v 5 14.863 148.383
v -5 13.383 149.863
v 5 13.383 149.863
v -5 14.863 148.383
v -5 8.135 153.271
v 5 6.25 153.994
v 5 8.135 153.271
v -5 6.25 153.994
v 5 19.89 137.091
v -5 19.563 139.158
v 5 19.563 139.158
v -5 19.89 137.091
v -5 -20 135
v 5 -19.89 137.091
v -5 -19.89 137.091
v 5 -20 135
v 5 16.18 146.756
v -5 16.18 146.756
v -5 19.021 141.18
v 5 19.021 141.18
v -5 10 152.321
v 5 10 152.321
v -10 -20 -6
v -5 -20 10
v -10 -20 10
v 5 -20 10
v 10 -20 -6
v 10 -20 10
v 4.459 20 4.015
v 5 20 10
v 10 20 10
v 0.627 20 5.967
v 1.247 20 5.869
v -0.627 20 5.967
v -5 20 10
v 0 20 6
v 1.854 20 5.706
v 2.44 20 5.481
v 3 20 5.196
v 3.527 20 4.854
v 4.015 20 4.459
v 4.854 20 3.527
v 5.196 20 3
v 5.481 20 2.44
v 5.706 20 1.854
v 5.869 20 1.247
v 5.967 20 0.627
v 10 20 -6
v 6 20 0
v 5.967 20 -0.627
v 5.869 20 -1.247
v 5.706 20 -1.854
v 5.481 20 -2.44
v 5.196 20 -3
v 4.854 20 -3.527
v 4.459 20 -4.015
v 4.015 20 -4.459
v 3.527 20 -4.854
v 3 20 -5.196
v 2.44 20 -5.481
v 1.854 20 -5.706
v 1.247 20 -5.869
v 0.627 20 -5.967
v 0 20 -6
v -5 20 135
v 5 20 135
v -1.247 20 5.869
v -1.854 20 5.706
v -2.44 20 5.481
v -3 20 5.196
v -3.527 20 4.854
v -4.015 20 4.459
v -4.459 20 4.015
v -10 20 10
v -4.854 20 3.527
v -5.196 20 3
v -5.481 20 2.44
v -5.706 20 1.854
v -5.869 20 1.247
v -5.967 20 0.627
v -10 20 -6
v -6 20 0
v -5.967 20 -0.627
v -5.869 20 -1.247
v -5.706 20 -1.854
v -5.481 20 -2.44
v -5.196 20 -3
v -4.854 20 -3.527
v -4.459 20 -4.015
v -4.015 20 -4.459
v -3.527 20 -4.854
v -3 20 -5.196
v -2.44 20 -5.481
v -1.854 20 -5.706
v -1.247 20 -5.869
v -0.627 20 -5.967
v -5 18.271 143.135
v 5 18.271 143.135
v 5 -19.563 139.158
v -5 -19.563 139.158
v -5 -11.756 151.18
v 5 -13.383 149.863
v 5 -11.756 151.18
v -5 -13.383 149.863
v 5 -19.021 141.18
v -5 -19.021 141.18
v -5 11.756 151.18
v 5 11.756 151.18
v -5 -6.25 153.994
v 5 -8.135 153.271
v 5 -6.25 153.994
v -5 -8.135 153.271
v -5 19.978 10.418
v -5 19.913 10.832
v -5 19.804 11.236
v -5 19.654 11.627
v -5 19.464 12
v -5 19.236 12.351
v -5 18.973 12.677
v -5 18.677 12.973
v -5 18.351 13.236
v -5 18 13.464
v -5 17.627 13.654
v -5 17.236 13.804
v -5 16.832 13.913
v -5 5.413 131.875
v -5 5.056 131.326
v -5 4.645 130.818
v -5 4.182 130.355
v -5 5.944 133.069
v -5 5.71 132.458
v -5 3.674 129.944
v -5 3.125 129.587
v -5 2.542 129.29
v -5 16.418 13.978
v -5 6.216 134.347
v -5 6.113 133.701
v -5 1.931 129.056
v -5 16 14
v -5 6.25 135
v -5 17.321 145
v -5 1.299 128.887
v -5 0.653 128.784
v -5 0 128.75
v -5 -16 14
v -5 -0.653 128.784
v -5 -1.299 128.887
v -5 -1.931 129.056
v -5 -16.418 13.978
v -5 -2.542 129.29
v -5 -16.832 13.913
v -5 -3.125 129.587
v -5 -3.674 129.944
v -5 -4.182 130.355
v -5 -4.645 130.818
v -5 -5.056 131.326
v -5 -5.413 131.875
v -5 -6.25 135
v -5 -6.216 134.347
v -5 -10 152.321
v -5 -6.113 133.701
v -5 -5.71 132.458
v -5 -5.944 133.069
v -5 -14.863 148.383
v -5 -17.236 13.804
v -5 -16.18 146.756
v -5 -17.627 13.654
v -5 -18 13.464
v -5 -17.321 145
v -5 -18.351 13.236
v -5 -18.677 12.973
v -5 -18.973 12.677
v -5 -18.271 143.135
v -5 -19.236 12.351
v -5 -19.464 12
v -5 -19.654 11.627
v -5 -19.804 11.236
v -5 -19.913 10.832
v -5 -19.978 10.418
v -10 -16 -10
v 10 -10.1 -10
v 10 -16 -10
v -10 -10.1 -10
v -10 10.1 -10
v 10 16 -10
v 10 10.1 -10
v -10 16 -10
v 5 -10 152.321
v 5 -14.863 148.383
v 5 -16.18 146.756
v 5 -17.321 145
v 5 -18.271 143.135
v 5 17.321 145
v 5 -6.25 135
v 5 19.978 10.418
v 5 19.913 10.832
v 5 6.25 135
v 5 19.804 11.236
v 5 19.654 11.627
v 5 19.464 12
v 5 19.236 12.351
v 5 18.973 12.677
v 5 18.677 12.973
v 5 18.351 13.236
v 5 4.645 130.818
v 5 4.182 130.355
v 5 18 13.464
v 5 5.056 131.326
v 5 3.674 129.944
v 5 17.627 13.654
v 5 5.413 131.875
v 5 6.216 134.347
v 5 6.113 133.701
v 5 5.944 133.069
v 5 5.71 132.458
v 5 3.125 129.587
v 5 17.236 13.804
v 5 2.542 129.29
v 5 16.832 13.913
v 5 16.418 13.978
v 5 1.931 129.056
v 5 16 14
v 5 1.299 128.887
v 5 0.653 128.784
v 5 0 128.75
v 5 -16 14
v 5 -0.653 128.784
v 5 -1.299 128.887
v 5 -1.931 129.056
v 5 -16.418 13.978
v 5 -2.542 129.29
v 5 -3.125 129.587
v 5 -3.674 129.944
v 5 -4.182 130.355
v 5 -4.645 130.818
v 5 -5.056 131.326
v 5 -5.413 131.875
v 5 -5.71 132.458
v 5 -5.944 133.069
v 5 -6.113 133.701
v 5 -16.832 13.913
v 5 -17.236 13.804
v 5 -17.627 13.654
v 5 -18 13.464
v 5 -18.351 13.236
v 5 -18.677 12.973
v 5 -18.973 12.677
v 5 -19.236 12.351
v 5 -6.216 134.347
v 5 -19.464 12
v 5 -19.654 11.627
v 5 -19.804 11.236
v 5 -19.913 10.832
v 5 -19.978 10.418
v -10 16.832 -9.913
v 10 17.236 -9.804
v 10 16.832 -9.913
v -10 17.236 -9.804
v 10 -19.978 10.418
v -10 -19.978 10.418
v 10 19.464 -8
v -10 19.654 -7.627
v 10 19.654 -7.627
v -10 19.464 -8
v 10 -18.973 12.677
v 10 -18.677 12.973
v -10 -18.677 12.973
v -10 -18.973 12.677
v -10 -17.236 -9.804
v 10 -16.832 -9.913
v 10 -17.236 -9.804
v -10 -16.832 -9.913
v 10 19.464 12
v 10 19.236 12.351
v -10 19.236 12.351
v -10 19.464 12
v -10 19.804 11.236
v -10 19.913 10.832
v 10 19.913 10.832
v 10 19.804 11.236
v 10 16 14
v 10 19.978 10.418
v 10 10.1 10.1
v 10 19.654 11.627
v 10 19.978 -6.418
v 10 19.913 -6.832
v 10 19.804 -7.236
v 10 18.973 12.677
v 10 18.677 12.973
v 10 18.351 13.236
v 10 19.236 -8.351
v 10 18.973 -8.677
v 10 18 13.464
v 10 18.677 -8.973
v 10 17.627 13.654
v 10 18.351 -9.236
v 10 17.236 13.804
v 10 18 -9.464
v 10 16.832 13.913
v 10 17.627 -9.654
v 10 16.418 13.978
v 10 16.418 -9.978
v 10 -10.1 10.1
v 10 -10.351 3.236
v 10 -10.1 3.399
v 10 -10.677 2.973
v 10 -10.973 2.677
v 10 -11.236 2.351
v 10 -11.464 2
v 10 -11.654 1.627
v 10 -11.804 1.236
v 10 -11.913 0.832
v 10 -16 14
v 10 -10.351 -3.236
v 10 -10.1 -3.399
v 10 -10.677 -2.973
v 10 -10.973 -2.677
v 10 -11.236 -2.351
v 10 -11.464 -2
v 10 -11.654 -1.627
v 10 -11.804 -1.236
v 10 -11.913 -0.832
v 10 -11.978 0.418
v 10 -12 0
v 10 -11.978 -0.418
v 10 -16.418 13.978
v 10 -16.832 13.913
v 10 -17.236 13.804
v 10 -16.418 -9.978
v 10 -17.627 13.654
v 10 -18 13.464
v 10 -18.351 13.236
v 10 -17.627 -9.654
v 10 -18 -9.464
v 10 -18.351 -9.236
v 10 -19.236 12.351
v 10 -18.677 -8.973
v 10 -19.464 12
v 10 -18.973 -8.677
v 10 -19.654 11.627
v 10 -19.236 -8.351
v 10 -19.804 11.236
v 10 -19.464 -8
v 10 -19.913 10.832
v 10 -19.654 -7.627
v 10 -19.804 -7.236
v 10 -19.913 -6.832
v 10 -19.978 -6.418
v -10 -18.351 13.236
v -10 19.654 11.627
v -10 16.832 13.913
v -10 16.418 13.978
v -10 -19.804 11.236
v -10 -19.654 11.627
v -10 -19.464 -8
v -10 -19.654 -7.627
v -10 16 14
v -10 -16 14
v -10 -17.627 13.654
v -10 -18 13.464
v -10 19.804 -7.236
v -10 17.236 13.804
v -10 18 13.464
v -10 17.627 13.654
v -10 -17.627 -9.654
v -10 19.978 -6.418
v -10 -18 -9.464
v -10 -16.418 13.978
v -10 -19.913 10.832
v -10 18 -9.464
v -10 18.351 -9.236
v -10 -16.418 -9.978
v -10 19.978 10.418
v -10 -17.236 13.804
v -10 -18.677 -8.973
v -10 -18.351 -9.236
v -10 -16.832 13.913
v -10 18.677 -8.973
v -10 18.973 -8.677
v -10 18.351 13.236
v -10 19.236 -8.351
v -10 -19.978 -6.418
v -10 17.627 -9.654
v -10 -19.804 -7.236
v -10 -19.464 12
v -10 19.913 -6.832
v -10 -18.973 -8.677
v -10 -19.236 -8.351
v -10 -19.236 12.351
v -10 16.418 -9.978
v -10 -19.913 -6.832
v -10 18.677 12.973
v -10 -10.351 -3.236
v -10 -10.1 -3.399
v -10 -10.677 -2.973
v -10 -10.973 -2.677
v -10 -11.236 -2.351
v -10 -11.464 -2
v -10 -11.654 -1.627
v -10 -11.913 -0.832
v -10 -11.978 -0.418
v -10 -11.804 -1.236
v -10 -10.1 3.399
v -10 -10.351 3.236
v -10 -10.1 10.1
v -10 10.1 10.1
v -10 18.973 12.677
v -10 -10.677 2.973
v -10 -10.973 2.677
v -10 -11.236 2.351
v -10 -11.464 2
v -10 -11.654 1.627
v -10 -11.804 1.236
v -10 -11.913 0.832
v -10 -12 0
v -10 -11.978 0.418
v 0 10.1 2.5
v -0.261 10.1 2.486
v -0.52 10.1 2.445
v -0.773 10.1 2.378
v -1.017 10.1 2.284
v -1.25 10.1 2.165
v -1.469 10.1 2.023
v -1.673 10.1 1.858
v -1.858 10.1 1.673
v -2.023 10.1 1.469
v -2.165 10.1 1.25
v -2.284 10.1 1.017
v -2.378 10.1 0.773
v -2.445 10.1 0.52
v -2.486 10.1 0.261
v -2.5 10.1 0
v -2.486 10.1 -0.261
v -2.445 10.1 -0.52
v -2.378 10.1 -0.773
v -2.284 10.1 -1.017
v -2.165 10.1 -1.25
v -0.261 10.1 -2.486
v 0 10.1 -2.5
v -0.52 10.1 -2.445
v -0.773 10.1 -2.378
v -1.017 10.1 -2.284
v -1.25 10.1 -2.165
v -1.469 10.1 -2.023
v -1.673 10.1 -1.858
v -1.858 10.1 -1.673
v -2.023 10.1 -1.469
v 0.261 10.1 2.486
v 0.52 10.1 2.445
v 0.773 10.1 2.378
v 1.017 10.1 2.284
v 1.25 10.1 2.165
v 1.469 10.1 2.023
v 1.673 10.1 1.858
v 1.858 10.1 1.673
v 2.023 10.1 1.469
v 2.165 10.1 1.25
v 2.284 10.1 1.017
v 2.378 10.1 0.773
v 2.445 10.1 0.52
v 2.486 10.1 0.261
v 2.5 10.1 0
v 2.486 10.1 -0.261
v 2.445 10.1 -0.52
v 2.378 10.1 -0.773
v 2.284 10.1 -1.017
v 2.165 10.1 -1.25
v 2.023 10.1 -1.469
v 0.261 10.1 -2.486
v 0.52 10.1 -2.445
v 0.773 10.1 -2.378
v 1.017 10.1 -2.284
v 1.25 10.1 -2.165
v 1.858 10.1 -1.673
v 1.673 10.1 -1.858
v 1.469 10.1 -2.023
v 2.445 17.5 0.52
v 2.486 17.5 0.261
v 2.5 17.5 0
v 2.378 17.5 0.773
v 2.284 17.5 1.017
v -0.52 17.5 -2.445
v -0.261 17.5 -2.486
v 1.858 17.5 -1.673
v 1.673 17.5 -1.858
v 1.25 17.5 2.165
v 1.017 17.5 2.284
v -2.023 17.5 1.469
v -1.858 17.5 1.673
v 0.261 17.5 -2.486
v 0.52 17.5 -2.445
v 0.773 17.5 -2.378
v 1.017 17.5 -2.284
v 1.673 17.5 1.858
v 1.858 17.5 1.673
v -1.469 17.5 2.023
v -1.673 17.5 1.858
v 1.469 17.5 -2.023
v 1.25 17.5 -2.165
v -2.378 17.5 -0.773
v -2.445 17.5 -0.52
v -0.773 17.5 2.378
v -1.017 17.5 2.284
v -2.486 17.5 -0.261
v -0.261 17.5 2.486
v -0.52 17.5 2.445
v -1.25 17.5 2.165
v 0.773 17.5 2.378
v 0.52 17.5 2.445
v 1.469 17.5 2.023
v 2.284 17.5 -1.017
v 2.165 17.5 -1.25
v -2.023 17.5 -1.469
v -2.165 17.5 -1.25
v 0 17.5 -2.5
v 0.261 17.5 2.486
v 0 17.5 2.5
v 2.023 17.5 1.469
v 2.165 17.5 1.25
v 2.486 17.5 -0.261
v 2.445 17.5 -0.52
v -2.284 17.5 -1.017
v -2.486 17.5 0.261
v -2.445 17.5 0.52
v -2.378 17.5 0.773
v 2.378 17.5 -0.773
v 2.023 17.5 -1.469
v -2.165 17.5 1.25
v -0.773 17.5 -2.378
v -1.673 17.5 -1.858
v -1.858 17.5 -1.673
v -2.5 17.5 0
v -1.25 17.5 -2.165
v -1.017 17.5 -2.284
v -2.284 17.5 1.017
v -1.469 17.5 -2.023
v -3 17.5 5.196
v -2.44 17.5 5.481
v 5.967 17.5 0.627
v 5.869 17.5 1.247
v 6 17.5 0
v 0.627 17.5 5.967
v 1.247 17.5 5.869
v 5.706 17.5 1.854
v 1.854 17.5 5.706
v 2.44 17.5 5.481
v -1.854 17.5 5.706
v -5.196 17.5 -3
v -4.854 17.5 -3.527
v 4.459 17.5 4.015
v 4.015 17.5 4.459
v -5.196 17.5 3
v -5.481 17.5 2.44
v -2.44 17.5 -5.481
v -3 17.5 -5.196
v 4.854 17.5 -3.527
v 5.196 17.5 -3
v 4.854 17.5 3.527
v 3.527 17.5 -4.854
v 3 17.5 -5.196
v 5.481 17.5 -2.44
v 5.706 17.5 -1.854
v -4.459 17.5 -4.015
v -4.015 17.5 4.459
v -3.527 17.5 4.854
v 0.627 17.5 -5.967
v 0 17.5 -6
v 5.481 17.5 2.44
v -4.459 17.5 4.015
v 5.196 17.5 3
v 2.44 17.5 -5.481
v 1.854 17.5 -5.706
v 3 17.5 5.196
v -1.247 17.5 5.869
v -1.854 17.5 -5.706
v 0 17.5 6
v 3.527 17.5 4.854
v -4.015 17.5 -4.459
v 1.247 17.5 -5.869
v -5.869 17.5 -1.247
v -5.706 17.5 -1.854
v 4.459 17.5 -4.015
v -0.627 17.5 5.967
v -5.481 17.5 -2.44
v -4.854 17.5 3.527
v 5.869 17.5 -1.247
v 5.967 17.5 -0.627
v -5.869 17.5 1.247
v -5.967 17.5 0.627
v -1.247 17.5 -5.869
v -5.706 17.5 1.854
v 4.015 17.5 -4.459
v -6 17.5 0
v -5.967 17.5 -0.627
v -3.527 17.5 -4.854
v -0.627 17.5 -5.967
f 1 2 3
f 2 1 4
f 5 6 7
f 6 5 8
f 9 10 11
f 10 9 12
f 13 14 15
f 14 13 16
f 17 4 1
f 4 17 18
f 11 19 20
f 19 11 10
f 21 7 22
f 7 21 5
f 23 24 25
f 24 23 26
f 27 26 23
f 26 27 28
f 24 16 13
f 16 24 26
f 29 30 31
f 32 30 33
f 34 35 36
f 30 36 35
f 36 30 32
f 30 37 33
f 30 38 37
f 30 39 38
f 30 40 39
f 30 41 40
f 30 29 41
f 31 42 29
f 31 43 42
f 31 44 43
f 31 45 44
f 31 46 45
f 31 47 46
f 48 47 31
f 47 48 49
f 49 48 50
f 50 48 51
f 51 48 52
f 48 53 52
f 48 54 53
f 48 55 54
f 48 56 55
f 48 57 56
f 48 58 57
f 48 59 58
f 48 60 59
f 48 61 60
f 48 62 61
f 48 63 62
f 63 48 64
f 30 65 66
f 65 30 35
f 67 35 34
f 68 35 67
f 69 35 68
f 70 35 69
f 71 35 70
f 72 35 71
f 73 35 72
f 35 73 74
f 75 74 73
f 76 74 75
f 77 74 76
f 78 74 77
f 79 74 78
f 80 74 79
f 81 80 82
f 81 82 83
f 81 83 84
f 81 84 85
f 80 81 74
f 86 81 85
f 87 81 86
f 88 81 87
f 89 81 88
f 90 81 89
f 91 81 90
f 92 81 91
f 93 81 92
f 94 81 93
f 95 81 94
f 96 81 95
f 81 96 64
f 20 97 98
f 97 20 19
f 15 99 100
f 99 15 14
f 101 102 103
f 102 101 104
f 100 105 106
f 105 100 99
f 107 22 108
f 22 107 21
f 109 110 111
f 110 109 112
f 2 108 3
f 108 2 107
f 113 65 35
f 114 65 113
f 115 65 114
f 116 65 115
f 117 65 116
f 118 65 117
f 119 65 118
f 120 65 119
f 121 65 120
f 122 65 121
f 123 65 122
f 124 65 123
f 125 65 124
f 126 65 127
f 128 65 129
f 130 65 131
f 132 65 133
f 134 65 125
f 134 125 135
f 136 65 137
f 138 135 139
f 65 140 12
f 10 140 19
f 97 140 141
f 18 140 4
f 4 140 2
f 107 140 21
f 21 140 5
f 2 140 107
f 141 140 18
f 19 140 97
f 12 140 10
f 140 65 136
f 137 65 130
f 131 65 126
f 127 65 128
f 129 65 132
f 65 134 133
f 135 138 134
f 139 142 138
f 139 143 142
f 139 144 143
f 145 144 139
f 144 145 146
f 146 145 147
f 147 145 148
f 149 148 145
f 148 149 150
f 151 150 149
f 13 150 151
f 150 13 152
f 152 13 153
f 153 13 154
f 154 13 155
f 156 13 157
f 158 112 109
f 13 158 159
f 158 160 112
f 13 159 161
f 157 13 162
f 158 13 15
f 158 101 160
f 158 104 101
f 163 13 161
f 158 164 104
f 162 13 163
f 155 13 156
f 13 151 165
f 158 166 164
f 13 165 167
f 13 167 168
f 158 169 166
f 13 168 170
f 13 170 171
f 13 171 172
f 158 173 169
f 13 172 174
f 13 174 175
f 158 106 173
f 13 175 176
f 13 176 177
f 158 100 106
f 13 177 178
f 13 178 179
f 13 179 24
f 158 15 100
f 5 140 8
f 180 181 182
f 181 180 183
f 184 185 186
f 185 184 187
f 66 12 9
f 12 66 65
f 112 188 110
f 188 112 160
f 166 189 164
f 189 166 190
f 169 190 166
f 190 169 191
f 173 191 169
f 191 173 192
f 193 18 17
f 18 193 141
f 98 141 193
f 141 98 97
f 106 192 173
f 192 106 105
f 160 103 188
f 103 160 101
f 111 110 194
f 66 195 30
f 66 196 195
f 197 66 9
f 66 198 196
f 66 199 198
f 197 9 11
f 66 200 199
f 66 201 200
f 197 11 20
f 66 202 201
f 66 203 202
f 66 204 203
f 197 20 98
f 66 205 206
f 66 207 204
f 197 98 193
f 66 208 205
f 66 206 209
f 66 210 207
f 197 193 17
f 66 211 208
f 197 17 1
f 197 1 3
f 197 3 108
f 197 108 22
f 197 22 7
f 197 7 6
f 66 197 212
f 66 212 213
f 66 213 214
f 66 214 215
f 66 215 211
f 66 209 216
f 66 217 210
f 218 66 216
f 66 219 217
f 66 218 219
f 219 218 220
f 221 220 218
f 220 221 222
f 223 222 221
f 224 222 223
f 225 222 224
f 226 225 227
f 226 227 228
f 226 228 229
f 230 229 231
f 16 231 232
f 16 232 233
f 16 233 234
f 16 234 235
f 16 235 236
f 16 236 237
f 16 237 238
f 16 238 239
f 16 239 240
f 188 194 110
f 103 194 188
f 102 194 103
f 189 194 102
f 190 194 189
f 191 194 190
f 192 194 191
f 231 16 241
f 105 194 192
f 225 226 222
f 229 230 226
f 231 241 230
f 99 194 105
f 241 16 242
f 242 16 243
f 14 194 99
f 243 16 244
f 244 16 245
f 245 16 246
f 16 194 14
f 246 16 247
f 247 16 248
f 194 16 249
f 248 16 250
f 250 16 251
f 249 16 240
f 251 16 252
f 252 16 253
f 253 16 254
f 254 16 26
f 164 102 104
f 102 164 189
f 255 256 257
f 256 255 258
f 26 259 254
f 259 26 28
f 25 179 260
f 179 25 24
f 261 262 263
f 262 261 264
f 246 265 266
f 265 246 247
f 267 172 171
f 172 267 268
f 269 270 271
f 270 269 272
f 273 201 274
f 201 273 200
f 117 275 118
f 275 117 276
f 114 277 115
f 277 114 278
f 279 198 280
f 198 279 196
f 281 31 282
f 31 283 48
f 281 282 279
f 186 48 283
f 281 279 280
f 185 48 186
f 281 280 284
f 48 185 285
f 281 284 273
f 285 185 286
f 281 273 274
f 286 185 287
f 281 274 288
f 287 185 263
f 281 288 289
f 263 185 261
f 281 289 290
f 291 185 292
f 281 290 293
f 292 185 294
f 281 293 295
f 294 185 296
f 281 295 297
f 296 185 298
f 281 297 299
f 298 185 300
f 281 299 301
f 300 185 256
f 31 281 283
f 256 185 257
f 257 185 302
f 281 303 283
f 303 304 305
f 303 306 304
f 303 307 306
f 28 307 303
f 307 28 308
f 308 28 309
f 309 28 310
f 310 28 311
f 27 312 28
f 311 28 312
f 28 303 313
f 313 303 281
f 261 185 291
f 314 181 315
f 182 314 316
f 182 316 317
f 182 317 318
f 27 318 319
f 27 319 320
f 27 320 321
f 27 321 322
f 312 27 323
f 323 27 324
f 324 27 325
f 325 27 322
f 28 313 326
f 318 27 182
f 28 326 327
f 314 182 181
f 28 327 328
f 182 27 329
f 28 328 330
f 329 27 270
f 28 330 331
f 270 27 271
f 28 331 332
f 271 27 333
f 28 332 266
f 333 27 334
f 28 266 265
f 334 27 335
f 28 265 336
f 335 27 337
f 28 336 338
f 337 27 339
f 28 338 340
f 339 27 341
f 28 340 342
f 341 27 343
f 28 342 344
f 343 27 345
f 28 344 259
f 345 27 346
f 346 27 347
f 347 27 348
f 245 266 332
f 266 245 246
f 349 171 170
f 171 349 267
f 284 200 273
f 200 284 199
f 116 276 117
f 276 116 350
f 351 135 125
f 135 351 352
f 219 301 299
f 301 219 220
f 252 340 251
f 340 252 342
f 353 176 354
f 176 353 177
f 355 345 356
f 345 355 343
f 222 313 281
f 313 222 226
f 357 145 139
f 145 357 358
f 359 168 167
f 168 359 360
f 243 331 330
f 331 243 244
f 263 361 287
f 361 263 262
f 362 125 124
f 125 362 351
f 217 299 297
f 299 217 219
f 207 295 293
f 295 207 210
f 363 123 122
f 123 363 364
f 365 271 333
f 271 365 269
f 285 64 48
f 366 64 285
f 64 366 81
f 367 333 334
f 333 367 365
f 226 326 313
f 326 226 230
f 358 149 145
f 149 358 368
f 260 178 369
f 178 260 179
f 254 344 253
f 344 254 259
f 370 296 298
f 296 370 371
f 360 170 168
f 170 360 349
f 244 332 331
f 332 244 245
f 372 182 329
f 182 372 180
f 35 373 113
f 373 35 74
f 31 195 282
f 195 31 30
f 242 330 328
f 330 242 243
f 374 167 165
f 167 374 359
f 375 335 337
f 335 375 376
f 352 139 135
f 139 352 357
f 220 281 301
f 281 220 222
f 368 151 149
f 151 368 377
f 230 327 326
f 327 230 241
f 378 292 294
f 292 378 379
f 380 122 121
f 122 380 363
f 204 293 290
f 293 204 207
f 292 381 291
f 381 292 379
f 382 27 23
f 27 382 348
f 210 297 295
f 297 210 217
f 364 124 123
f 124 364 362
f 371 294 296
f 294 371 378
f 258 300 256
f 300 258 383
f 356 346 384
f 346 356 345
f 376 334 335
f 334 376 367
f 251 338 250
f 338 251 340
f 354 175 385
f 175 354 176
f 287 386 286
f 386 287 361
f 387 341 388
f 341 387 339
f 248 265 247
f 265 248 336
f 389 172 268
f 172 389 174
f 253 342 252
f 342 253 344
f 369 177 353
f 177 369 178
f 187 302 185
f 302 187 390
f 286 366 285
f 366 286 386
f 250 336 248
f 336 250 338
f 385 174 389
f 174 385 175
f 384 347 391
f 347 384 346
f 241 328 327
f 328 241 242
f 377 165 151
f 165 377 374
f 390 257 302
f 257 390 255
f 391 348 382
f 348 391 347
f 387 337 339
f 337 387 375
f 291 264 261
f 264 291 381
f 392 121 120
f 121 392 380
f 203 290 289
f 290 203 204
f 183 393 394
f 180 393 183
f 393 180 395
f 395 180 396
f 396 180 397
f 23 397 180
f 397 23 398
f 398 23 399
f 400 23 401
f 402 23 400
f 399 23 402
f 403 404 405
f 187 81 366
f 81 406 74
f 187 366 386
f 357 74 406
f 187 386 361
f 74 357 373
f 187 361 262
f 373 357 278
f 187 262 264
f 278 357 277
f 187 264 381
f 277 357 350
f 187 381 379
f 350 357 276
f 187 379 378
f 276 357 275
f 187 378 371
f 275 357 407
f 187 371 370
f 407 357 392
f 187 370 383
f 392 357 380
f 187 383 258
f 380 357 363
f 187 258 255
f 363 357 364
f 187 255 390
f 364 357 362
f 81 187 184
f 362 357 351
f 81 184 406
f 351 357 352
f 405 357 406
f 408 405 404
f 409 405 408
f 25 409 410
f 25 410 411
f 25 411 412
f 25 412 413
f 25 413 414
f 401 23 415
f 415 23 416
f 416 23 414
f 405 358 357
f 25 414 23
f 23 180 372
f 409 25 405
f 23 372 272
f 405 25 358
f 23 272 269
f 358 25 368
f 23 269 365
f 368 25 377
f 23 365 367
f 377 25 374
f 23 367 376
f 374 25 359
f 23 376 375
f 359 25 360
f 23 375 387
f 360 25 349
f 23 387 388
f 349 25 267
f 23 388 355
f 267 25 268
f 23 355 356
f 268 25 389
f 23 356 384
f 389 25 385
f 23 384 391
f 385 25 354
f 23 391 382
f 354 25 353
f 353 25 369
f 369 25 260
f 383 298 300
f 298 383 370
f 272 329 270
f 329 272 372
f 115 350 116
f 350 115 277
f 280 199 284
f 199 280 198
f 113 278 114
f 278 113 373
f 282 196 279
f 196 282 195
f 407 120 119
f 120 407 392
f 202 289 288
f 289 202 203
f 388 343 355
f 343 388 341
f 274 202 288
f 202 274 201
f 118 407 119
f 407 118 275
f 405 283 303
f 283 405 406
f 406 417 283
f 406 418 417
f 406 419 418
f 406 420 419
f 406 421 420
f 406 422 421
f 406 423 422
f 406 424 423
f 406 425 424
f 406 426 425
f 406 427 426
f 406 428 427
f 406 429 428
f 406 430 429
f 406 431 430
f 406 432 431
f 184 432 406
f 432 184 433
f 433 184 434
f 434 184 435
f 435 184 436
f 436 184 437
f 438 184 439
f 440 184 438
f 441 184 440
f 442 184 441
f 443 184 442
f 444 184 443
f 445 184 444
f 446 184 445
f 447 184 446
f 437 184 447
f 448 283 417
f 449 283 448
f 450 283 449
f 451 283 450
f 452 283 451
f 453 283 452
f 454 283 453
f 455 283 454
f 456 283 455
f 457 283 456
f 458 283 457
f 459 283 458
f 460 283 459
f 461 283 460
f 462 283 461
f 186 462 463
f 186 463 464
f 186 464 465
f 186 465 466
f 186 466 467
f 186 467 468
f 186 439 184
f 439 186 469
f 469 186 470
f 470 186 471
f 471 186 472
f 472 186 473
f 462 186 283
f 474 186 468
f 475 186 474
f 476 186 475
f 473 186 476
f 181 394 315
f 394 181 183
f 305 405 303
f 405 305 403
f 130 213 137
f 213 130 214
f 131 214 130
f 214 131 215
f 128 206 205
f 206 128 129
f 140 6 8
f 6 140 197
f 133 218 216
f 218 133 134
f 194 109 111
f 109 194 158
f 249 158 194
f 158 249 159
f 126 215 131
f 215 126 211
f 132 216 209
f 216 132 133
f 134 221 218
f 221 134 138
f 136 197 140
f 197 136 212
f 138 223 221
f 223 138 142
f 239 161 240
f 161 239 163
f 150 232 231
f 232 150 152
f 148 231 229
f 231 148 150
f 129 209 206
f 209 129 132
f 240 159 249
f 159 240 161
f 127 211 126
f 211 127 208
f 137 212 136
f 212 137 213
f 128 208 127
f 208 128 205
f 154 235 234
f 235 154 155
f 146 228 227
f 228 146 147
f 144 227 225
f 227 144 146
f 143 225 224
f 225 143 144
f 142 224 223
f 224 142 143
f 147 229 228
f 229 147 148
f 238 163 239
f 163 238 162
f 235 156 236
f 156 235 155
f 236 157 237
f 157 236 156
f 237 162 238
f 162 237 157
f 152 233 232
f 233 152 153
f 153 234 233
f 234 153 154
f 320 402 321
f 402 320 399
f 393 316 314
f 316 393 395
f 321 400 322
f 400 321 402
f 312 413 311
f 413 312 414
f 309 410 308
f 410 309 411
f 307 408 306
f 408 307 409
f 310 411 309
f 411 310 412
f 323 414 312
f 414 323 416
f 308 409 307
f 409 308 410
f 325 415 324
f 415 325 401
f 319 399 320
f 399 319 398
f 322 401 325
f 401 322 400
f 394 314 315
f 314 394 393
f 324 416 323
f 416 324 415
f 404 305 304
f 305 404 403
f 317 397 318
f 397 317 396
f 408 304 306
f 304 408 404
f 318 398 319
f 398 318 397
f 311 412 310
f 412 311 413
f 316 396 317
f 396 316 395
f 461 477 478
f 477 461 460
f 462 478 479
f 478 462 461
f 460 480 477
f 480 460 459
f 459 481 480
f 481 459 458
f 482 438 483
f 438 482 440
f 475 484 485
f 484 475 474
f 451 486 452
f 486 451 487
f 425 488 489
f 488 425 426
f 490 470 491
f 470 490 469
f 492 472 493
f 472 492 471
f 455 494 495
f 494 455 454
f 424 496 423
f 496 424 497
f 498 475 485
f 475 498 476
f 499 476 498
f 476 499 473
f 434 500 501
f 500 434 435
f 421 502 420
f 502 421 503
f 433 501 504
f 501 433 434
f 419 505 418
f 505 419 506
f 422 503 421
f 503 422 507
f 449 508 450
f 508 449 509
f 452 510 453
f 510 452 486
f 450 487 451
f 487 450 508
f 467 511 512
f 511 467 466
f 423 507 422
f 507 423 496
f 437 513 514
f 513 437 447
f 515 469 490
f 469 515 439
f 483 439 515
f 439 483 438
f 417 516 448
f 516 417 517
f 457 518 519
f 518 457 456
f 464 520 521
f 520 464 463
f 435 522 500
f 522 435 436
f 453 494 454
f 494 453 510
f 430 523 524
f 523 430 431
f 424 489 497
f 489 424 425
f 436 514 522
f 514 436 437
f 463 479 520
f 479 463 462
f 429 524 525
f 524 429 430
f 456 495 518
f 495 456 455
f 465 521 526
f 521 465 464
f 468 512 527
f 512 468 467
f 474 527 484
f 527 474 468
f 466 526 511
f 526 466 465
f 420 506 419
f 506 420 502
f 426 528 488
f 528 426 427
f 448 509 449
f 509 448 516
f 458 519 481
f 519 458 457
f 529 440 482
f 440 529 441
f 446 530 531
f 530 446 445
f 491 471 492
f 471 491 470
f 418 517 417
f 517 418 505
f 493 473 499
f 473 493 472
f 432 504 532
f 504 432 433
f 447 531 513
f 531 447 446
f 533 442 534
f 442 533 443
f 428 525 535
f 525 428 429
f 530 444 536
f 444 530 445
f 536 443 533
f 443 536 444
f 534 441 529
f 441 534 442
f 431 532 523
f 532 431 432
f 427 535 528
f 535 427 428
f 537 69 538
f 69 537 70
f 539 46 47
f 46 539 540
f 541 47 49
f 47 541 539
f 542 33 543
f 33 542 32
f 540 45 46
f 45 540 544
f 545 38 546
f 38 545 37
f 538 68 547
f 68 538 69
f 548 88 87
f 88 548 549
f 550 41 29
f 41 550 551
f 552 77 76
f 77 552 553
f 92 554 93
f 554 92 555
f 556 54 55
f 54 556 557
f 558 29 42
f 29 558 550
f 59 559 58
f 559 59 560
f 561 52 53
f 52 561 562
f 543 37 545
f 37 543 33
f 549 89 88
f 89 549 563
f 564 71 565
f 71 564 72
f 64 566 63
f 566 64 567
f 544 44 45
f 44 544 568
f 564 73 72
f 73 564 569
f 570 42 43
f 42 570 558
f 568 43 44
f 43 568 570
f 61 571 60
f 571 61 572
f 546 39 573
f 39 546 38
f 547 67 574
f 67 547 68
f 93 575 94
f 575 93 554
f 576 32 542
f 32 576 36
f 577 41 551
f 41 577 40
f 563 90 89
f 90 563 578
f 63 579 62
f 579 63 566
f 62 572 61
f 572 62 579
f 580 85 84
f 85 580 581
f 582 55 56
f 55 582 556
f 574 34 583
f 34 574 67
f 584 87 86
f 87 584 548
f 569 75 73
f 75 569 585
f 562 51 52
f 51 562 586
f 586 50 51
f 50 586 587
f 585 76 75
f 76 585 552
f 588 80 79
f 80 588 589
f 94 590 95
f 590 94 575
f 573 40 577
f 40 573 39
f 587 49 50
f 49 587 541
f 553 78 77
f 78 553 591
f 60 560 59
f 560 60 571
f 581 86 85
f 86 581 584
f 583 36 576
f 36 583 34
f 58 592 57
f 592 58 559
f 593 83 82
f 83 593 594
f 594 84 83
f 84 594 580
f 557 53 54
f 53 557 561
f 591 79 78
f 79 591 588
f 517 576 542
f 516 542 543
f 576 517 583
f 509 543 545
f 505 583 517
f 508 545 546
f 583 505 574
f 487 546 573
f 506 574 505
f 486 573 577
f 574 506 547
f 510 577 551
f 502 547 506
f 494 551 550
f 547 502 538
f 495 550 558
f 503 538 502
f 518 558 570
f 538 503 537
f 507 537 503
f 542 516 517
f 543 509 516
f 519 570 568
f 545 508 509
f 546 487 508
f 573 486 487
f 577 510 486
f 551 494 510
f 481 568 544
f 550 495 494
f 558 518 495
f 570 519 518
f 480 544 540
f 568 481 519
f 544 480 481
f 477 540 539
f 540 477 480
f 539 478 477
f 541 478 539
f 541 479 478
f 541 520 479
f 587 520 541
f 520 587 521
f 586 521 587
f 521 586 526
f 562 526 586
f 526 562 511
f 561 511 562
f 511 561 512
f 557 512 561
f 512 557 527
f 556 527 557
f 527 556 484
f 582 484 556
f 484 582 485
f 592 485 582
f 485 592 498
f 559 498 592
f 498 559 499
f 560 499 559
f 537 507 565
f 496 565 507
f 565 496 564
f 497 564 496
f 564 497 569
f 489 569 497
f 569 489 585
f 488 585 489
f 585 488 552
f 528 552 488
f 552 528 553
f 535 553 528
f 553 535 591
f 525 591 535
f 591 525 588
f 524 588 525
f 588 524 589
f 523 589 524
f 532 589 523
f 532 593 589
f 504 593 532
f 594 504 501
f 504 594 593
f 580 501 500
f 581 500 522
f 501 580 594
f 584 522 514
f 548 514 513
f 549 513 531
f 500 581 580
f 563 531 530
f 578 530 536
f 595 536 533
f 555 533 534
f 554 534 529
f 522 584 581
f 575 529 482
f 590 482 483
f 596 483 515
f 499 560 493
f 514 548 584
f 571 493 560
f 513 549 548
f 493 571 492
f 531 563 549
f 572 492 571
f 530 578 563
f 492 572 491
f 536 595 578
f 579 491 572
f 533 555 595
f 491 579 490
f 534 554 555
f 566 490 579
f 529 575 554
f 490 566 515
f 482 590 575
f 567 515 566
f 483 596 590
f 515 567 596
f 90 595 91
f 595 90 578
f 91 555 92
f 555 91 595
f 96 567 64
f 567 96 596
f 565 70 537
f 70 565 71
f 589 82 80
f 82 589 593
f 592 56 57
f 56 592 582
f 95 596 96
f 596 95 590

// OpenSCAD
translate([0,0,135])
%difference(){
rotate([0,90,0]) cylinder(r=115, h=20, center=true, $fn=60);
rotate([0,90,0]) cylinder(d=8, h=25, center=true, $fn=60);
}

difference(){
  union(){
    hull(){
      for(Y=[-1,1]) translate([0,10*Y,0])
      rotate([0,90,0]) cylinder(d=20, h=10, center=true, $fn=60);
      translate([0,0,135]) rotate([0,90,0]) cylinder(d=40, h=10, center=true, $fn=60);
    }
    hull(){
      for(Z=[-1,1], Y=[-1,1]) {
        translate([0,16*Y,10]) rotate([0,90,0]) cylinder(d=8, h=20, center=true, $fn=60);
        translate([0,16*Y,-6]) rotate([0,90,0]) cylinder(d=8, h=20, center=true, $fn=60);
      }
    }
  }
  cube([40,20.2,20.2],center=true);
  
  hull() for(Z=[135,155]){
    translate([0,0,Z]) rotate([0,90,0]) cylinder(d=12.5, h=25, center=true, $fn=60);
  }
  translate([0,-8,0]) rotate([0,90,0]) cylinder(d=8, h=25, center=true, $fn=60);
  translate([0,15,0]) rotate([90,0,0]) cylinder(d=5, h=15, center=true, $fn=60);
  translate([0,20,0]) rotate([90,0,0]) cylinder(d=12, h=5, center=true, $fn=60);
}
